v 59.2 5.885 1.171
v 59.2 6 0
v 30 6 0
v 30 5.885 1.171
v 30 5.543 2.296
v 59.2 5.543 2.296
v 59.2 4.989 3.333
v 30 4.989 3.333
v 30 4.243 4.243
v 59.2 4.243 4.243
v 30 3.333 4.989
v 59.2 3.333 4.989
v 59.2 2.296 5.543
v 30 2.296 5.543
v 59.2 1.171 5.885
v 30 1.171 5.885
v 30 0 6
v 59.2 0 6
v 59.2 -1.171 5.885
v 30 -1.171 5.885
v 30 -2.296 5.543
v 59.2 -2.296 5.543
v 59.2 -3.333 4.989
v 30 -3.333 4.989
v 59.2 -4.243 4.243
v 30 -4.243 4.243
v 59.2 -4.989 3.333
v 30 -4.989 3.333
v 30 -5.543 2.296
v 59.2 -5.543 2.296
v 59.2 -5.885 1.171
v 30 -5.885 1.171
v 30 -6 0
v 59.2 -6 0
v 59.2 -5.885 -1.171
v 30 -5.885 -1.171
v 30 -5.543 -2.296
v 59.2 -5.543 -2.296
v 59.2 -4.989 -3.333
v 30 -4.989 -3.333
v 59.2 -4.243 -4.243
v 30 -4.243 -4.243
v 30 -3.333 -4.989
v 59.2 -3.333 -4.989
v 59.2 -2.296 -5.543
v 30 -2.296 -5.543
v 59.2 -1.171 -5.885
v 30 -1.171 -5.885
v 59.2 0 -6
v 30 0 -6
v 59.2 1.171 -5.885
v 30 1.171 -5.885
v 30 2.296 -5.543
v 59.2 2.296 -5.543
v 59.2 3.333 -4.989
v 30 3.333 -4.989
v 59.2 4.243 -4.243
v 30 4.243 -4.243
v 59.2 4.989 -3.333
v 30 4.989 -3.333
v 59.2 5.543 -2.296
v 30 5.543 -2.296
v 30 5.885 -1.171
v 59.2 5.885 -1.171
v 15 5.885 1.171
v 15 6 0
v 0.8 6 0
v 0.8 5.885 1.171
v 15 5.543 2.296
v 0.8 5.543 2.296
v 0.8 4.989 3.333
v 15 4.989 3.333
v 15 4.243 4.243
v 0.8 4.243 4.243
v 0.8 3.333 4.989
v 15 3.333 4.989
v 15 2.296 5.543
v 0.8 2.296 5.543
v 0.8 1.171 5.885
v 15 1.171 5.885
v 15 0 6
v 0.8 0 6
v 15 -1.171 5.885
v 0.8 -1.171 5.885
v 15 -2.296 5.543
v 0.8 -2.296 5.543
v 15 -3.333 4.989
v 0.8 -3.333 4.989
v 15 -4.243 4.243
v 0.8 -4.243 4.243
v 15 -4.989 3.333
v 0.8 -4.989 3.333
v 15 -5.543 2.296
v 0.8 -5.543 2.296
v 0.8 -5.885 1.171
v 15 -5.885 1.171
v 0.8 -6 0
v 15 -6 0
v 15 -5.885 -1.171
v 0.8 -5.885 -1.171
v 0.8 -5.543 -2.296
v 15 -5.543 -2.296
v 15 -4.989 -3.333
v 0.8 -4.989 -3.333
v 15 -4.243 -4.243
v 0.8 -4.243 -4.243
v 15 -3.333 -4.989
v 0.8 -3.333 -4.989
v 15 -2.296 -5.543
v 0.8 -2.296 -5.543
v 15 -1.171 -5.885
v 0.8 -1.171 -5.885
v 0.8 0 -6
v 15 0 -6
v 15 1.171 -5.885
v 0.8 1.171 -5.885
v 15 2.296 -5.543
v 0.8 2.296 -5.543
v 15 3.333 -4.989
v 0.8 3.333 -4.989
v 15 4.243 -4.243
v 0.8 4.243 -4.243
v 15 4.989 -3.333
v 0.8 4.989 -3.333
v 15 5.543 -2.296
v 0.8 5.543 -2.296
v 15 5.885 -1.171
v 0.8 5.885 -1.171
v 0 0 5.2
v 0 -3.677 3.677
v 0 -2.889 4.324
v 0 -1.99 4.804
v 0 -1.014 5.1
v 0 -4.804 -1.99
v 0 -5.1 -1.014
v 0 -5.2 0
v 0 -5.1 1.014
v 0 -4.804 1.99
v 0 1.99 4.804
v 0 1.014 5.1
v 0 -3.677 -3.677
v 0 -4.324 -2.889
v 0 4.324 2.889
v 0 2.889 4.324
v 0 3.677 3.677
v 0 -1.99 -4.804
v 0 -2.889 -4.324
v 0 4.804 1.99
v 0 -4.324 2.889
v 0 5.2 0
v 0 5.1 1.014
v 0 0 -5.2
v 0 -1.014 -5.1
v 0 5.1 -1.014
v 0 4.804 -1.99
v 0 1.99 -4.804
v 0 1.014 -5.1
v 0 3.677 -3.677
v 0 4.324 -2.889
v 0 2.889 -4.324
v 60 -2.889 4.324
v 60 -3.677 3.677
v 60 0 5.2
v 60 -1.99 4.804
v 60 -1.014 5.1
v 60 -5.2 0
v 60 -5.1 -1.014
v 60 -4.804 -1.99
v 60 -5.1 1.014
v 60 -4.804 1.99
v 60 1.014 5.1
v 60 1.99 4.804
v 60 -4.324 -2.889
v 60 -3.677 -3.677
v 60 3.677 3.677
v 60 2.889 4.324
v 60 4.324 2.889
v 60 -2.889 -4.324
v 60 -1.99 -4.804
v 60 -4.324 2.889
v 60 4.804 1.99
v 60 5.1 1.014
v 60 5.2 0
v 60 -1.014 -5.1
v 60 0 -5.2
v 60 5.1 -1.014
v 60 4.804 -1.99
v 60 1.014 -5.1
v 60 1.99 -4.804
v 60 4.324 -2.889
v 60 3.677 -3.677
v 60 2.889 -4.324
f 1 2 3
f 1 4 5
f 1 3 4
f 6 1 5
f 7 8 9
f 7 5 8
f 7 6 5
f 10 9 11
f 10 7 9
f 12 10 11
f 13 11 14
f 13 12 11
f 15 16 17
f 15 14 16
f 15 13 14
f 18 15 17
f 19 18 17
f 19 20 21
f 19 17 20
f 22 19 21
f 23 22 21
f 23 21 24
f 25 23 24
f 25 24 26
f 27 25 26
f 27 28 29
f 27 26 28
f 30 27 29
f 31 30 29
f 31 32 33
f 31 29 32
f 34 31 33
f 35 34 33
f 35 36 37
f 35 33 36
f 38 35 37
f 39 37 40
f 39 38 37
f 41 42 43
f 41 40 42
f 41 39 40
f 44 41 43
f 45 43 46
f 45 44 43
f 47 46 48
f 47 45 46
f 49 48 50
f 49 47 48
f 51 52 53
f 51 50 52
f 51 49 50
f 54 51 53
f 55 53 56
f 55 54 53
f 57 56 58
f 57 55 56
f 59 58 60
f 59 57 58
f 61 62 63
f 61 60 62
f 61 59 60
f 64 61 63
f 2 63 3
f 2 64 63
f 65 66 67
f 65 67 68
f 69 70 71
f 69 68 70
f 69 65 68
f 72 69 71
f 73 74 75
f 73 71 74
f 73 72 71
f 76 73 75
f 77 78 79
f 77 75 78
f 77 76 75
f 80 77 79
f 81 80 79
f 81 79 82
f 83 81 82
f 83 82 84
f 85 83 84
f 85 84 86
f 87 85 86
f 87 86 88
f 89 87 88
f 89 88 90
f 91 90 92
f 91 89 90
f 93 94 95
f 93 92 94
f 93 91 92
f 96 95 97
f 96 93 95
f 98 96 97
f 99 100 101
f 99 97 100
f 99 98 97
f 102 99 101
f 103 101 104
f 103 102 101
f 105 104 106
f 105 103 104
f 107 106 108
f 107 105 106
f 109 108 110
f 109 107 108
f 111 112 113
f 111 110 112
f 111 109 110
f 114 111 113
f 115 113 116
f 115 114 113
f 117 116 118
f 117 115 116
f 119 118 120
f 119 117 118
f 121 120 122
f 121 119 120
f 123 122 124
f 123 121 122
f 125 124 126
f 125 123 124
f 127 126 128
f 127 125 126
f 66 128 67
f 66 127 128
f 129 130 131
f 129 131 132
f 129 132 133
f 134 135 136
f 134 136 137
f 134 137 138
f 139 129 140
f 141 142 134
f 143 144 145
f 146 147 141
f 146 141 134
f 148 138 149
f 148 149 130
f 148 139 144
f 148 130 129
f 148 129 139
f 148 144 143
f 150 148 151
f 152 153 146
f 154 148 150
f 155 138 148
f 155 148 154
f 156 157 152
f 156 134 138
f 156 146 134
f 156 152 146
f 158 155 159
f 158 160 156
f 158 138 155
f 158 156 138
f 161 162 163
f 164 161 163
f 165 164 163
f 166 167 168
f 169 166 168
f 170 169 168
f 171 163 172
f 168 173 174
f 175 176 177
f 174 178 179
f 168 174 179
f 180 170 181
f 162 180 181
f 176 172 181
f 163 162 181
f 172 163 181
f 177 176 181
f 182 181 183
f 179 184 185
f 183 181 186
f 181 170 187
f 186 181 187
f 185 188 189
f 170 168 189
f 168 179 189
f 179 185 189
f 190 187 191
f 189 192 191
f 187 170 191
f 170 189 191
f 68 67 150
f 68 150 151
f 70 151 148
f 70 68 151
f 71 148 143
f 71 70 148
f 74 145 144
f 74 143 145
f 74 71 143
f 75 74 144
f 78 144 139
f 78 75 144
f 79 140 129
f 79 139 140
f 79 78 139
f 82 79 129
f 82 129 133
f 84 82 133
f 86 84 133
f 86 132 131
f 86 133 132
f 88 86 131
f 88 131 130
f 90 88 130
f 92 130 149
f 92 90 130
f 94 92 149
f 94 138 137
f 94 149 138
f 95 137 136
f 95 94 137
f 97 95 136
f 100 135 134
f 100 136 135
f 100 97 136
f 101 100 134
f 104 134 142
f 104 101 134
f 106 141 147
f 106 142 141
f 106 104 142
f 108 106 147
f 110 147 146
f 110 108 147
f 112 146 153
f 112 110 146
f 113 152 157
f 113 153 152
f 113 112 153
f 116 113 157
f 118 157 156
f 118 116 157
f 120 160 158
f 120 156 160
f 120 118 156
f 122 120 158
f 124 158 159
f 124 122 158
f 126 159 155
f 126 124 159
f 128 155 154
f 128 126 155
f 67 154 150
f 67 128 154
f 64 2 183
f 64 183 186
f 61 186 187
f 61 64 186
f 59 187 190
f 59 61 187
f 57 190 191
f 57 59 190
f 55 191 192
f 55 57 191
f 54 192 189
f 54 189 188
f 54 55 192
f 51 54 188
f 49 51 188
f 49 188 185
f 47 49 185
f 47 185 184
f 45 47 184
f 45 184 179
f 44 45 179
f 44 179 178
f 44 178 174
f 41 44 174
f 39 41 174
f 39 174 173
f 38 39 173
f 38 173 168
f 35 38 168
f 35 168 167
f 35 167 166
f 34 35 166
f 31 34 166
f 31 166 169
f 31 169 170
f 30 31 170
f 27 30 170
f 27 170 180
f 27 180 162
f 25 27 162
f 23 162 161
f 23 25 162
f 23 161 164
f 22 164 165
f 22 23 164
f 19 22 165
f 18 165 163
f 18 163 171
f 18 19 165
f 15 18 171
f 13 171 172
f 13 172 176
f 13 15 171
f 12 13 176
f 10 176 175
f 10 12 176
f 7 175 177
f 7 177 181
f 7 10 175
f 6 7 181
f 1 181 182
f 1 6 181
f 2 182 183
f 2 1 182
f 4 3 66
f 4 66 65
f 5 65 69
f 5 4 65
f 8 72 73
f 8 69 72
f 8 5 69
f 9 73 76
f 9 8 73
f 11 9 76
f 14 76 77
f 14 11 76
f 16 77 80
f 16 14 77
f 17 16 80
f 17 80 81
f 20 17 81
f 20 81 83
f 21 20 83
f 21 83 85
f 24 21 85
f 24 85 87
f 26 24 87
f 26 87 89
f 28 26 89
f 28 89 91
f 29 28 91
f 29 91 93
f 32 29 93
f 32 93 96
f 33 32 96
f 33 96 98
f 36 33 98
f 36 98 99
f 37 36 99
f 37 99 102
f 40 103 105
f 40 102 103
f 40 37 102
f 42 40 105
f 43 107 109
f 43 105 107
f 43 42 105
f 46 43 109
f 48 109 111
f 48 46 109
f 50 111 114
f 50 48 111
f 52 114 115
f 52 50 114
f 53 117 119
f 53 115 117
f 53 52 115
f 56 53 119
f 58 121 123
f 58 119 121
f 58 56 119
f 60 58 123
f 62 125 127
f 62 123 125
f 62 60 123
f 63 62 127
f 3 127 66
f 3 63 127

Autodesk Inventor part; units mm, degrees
ref_plane "YZ Plane" through (0, 0, 0) normal (1, 0, 0) x (0, 1, 0)
ref_plane "XZ Plane" through (0, 0, 0) normal (0, 1, 0) x (-1, 0, 0)
sketch "Sketch1" plane through (0, 0, 0) normal (0, 0, 1) x (1, 0, 0)
  line L0 (0, 0) -> (0, 6)
  line L1 (0, 6) -> (15, 6)
  line L2 (15, 6) -> (15, 6)
  line L3 (15, 6) -> (30, 6)
  line L4 (30, 6) -> (30, 6)
  line L5 (30, 6) -> (60, 6)
  line L6 (60, 6) -> (60, 0)
  line L7 (60, 0) -> (0, 0)
  dimension "d1" = 12
  dimension "d3" = 12
  dimension "d4" = 15
  dimension "d5" = 45
  dimension "d6" = 30
revolve "Revolution1" add sketch "Sketch1" angle 360 about axis through (60, 0, 0) along (-1, 0, 0)
thread "Thread1" size "M12x1.75" class "6g" standard "ISO Metric profile" length 15
thread "Thread2" size "M12x1.75" class "6g" standard "ISO Metric profile" length 30
chamfer "Chamfer1" distance 0.8 angle 45 2 edges at (60, -6, 0) (0, -6, 0)
ref_plane "Work Plane1" through (15, 0, 0) normal (1, 0, 0) x (0, 1, 0)
sketch "Sketch2" plane through (15, 0, 0) normal (1, 0, 0) x (0, 1, 0)
  circle A0 centre (0, 0) radius 6
  point P0 (0, 0)
  dimension "d29" = 12
boundary_patch "Boundary Patch1"
equation "\"d8\" = d4"
equation "\"d23\" = b"
equation "\"d25\" = chamfer"
equation "\"d1\" = d"
equation "\"d3\" = d1_"
equation "\"d4\" = b1"
equation "\"d5\" = L"
equation "\"d6\" = b"
equation "\"d29\" = d"
equation "\"chamfer\" = 0.8"
equation "\"d\" = 12"
equation "\"d1_\" = 12"
equation "\"b1\" = 15"
equation "\"L\" = 45"
equation "\"b\" = 30"
equation "\"d28\" = -b1"
equation "\"Grip_Length\" = 15"
properties part number "Stud M12-6g×45 GOST 22034-76" material "Steel, Mild"
